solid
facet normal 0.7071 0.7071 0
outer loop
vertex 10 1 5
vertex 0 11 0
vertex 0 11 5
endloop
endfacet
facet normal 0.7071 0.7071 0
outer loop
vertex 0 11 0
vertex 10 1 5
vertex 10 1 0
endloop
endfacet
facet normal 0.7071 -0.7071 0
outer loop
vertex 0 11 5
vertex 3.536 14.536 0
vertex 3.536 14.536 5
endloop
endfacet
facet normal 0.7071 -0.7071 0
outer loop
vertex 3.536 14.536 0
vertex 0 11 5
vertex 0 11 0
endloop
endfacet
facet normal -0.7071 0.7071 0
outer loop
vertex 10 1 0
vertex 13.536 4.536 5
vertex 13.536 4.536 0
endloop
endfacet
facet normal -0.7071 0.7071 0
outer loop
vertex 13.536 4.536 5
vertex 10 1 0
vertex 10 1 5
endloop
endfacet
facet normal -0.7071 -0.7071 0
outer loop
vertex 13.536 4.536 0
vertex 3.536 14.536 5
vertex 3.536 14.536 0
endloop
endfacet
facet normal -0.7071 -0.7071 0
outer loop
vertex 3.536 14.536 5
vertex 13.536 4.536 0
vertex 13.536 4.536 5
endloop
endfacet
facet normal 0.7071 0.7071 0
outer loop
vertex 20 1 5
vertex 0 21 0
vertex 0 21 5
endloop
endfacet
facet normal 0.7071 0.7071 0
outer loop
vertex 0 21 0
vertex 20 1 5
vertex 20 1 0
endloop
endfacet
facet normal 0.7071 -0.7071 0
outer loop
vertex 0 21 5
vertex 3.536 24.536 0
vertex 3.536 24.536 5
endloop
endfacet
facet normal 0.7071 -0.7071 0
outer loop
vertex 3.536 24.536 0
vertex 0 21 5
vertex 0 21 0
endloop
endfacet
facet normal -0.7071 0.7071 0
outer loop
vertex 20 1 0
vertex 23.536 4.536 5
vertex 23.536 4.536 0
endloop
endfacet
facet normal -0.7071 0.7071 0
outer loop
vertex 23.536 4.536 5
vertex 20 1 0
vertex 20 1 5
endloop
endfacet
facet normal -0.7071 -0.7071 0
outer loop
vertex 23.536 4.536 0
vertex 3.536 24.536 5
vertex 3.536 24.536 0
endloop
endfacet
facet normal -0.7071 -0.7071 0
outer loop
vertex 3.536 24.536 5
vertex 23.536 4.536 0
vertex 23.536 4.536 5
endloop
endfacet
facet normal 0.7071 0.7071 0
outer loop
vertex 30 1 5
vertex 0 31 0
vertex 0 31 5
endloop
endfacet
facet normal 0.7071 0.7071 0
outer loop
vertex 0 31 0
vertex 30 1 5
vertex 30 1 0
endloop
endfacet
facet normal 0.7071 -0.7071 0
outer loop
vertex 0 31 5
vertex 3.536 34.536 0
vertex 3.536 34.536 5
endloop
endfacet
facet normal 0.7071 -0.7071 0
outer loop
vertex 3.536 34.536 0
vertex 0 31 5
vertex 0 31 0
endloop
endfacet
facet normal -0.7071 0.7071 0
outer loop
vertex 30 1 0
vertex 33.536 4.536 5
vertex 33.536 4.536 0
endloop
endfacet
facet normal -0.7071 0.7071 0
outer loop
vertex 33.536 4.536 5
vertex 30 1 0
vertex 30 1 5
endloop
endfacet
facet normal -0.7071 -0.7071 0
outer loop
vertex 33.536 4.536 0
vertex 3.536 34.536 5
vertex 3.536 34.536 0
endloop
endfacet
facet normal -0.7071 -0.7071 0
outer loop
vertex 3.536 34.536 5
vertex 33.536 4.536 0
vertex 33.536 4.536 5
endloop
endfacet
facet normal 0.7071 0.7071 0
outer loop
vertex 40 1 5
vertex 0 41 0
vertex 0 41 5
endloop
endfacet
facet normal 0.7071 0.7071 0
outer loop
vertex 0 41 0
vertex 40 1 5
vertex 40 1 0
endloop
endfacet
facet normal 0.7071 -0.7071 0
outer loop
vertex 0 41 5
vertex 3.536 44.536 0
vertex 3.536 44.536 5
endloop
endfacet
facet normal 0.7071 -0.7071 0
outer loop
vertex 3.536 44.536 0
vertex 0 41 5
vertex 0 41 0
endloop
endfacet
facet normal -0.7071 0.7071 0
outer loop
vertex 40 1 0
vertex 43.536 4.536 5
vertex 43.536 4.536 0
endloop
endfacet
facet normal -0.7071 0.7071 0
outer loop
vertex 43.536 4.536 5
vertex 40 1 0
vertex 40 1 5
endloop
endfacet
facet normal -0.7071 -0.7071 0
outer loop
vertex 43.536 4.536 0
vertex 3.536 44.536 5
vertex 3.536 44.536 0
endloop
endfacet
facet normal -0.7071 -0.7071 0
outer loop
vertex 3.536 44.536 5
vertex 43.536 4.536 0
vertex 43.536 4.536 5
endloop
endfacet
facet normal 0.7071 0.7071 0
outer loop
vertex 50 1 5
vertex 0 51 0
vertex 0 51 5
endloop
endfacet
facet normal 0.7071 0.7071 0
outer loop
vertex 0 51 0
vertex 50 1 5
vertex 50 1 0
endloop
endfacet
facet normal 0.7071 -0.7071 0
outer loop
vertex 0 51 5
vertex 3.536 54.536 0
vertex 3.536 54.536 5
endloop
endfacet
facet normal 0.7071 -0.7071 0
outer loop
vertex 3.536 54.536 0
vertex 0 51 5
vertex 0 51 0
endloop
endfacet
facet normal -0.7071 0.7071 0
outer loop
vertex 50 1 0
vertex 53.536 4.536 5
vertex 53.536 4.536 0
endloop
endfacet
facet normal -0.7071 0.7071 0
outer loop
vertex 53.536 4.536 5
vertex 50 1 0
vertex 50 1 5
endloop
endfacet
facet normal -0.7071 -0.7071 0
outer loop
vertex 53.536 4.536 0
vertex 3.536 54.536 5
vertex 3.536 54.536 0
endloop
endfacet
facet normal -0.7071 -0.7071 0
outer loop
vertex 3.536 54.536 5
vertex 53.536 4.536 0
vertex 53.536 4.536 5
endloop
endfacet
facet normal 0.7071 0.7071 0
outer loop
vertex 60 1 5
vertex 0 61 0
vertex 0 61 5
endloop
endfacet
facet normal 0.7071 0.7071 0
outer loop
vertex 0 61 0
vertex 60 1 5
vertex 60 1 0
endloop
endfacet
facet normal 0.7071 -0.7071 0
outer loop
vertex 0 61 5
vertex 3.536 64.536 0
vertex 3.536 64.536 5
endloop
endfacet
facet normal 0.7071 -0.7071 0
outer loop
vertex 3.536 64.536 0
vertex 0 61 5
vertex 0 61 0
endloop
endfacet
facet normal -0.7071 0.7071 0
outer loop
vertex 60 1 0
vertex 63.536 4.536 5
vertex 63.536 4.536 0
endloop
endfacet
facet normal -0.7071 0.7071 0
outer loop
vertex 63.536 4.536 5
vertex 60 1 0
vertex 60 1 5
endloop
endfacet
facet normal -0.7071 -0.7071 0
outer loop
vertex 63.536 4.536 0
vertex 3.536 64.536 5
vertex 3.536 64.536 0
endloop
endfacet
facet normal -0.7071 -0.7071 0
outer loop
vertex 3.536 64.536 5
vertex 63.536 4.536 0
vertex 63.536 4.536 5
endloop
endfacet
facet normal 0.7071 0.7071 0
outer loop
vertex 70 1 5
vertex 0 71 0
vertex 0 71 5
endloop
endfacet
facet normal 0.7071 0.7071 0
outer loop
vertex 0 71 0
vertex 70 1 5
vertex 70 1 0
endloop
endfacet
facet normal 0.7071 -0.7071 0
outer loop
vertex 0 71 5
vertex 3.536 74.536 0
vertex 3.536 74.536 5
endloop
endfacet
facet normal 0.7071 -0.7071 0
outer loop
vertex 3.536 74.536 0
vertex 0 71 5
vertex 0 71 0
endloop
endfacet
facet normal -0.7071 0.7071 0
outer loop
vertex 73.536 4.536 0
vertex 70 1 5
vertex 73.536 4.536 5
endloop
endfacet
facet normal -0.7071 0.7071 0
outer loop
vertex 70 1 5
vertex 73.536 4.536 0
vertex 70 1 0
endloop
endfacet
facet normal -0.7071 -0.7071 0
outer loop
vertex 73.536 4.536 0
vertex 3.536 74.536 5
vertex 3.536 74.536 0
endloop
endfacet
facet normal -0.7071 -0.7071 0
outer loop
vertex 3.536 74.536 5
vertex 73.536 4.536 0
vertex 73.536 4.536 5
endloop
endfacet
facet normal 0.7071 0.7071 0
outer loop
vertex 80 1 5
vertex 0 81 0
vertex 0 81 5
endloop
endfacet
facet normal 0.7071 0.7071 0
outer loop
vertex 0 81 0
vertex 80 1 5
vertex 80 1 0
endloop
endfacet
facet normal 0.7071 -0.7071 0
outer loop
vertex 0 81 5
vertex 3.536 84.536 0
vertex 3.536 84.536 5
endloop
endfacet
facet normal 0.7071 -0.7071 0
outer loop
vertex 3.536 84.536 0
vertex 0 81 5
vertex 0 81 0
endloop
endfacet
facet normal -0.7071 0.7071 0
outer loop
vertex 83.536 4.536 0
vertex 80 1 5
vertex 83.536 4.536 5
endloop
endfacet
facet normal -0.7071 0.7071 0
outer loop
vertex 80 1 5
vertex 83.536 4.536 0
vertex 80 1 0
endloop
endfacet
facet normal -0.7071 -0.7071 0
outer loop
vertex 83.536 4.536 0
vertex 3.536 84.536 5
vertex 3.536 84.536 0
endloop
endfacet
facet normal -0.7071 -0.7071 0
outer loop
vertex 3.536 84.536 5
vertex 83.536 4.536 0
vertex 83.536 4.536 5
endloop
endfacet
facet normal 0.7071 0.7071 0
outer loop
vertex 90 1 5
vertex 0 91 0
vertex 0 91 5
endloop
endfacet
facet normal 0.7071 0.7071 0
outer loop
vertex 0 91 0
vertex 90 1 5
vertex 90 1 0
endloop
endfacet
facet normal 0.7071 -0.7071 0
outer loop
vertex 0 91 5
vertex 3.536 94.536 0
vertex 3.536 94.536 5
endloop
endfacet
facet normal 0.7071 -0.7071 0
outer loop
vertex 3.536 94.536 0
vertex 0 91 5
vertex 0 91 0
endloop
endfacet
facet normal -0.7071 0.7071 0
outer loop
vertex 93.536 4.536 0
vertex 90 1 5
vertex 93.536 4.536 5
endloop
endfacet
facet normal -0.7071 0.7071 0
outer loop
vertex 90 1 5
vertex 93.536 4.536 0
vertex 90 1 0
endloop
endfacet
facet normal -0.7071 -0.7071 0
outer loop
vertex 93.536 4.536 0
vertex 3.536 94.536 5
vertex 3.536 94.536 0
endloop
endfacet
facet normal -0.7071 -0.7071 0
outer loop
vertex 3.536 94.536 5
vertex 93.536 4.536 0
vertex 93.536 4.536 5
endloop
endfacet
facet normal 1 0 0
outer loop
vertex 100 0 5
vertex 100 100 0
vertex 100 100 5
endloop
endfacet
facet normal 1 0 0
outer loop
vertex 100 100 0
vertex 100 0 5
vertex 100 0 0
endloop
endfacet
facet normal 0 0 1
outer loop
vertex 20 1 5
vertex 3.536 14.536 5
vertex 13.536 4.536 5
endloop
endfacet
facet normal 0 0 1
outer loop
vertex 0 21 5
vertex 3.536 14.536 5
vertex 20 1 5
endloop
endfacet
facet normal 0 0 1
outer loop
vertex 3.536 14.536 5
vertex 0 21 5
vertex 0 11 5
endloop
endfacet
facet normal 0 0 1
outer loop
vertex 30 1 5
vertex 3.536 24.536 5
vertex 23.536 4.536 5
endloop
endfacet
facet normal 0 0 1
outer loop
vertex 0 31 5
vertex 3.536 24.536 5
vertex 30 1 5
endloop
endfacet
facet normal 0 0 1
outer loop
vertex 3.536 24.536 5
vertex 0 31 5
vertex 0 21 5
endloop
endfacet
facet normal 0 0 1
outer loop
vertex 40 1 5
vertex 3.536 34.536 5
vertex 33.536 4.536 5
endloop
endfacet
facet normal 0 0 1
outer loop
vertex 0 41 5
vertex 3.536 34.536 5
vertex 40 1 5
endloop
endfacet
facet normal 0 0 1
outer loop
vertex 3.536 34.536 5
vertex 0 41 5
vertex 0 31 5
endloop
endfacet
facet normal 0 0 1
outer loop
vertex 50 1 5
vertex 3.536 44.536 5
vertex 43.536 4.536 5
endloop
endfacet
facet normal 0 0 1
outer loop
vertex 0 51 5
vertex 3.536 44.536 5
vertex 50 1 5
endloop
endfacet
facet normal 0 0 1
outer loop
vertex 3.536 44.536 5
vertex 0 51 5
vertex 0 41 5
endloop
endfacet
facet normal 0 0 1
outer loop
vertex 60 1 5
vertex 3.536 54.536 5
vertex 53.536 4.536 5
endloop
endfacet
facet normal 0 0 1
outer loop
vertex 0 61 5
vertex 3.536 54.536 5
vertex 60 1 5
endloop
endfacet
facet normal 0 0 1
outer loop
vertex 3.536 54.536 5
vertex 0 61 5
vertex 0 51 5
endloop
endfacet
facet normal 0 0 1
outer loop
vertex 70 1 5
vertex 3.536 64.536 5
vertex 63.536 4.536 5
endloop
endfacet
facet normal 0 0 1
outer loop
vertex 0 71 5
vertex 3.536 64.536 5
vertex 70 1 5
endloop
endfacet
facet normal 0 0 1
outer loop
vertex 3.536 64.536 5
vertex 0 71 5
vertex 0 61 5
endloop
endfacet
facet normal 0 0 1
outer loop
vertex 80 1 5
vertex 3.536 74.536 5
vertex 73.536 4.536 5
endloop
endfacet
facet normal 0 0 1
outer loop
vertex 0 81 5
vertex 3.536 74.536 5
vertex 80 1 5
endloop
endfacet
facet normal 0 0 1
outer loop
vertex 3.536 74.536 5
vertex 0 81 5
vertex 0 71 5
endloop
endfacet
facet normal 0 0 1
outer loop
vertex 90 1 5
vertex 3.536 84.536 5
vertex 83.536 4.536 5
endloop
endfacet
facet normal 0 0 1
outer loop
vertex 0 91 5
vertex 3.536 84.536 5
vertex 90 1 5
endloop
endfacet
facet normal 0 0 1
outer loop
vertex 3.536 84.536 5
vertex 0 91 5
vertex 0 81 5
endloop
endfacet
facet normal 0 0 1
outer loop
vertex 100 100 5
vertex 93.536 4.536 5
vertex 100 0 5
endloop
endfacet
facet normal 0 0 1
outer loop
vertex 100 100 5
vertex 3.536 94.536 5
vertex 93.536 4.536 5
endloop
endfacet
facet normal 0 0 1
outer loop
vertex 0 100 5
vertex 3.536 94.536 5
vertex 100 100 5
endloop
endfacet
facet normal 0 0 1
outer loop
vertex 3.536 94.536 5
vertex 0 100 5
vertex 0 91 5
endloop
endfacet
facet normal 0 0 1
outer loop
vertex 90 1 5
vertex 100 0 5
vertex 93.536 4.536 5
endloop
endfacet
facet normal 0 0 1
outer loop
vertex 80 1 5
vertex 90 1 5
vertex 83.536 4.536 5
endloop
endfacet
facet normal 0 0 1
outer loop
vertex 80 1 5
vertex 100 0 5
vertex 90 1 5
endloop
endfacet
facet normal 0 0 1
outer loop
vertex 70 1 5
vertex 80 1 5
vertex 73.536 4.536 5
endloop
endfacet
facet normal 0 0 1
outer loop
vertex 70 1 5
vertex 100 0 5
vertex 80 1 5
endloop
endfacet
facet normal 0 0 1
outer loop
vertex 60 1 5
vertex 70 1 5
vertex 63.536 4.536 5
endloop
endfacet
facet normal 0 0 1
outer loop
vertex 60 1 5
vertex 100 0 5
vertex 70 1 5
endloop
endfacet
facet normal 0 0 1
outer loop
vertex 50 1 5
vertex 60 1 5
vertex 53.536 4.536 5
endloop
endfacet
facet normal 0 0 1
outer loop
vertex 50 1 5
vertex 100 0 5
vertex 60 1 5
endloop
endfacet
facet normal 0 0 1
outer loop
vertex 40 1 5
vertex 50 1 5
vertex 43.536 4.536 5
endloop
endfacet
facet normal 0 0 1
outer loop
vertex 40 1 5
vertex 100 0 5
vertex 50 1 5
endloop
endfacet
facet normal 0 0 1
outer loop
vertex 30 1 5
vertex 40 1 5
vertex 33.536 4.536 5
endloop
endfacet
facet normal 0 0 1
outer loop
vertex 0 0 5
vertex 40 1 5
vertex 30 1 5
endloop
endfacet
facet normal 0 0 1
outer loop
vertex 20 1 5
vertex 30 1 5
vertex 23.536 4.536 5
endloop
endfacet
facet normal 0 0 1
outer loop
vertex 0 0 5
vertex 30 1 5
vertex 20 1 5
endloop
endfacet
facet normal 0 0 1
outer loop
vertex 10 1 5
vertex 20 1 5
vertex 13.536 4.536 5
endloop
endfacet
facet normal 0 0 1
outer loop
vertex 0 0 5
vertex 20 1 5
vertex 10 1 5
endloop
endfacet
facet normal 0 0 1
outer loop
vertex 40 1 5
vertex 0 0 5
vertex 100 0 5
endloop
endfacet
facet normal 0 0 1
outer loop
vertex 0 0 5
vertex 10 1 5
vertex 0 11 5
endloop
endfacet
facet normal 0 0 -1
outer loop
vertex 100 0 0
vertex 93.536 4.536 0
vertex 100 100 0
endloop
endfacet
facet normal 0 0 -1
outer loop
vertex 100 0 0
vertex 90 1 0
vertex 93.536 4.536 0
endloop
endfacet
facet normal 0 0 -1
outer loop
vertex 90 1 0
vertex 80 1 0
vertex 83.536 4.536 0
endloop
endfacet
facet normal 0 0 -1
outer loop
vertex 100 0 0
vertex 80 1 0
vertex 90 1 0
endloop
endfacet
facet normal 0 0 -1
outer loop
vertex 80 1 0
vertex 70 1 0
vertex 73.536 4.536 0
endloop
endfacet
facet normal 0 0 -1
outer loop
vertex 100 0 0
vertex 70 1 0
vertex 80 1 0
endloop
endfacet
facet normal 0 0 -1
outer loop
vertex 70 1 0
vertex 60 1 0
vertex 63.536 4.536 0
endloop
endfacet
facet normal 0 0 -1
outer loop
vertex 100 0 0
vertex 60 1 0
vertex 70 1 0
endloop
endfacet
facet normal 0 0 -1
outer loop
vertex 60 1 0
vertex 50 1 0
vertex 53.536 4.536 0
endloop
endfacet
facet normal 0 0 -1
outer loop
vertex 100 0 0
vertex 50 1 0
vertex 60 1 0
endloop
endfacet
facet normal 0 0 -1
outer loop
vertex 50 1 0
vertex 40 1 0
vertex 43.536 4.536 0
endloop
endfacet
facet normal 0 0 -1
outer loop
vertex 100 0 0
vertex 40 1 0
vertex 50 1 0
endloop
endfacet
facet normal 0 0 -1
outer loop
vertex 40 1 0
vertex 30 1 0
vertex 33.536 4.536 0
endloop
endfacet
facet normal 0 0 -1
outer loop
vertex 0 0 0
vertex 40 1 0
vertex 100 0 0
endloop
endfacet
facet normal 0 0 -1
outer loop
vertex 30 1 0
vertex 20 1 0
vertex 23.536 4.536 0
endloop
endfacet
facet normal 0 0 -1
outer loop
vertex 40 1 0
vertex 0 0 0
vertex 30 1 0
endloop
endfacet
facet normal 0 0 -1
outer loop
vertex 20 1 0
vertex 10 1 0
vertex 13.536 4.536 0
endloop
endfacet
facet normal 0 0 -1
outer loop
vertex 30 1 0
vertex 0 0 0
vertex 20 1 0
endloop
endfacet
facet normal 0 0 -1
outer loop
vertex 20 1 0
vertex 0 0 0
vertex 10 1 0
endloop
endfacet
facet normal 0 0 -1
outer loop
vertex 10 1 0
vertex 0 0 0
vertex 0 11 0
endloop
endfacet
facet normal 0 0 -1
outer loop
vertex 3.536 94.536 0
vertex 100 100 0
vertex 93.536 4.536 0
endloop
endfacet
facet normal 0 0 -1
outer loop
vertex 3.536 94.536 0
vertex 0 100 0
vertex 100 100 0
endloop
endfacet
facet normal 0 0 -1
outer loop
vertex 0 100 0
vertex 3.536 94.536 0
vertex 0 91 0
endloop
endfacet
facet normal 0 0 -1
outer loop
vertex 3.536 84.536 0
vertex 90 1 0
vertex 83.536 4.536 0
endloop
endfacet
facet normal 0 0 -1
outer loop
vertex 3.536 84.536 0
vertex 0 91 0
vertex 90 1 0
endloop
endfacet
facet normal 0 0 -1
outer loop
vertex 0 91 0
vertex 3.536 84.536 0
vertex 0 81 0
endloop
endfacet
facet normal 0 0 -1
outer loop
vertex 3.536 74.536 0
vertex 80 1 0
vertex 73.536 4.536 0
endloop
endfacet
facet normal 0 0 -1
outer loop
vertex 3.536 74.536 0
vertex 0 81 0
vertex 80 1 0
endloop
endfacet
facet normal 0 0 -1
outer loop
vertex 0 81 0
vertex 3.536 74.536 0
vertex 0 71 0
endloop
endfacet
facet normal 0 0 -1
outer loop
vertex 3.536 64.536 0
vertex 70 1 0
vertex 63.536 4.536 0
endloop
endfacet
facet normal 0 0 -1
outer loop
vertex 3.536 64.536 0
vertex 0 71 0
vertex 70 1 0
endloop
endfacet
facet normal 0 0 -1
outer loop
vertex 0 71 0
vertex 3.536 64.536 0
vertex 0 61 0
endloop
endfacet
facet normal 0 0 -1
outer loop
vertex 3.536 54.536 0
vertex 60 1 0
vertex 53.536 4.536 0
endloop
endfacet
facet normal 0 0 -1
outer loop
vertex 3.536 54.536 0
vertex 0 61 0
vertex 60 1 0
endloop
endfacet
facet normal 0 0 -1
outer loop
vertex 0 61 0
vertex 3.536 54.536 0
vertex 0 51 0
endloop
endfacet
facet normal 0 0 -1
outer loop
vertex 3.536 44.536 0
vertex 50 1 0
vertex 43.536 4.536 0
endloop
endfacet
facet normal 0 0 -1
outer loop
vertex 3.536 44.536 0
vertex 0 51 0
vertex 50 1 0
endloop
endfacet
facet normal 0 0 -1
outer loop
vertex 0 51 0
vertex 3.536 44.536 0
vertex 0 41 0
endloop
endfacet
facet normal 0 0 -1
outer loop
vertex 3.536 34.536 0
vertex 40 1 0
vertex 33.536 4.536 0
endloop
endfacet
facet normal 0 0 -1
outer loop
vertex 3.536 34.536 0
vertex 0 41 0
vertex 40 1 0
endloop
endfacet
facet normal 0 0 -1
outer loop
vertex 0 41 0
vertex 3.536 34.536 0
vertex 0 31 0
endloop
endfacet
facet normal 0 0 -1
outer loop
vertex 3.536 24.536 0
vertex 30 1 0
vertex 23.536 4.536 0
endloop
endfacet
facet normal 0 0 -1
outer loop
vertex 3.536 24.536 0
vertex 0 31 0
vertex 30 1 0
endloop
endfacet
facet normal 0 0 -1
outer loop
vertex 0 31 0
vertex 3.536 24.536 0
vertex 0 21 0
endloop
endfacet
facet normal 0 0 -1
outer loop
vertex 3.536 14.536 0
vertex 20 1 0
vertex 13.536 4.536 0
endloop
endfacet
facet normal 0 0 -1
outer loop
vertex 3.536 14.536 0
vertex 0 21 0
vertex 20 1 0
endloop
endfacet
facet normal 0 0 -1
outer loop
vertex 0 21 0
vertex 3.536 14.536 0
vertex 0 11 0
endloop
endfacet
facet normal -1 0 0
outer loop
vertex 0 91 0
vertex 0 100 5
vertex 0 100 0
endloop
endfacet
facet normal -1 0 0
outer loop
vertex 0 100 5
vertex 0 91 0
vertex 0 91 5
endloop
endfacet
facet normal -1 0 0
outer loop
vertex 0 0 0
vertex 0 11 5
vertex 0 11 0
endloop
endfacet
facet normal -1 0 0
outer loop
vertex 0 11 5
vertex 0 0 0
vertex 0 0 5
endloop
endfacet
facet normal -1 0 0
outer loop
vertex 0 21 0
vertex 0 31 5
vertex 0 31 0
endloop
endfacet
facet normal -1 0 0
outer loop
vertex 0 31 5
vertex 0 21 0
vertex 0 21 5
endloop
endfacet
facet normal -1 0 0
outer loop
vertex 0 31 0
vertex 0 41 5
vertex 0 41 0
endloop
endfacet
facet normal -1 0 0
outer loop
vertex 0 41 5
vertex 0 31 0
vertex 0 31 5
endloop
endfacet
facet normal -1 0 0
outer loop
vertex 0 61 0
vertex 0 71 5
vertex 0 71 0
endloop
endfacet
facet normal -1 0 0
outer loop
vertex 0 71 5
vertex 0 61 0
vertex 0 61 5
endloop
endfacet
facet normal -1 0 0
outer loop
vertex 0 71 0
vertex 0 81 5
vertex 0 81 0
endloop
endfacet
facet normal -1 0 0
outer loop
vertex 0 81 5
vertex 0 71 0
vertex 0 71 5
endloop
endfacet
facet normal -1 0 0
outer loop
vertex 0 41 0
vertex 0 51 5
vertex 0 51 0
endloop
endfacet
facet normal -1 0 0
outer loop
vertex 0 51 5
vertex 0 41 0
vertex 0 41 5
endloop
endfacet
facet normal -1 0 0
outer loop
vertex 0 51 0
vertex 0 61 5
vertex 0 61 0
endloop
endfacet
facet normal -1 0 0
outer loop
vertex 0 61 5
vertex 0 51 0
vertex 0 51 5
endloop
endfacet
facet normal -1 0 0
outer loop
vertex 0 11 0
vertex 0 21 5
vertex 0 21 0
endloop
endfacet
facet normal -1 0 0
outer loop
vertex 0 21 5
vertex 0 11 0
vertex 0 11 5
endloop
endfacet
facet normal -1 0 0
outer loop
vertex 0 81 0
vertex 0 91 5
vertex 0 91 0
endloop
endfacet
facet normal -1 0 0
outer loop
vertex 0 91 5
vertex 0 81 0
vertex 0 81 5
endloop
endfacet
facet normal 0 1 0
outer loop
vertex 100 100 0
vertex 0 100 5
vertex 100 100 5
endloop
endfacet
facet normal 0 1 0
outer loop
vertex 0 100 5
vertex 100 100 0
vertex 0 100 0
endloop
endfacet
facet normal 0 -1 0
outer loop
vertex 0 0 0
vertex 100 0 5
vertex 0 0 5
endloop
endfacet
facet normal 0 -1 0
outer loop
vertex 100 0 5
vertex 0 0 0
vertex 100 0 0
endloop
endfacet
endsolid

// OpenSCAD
w = 100;
h = 100;
l = 5;

hw = 5;
hg = 5;
vg = 1;

count = w/(hw+hg);
dw = w/count;
dh = sqrt(w*w + h*h)/count;

difference() {
cube([w,h,l]);

for (i = [1 : count-1]) {
    color("red")
    translate([i*(hw+hg),vg,-1])
    rotate(45,0,0)
    cube([hw,dh*i,l+2]);
    
    mirror(10,10,0){
    color("red")
    translate([i*(hw+hg),vg,-1])
    rotate(45,0,0)
    cube([hw,dh*i,l+2]);
    }
}
 
}
